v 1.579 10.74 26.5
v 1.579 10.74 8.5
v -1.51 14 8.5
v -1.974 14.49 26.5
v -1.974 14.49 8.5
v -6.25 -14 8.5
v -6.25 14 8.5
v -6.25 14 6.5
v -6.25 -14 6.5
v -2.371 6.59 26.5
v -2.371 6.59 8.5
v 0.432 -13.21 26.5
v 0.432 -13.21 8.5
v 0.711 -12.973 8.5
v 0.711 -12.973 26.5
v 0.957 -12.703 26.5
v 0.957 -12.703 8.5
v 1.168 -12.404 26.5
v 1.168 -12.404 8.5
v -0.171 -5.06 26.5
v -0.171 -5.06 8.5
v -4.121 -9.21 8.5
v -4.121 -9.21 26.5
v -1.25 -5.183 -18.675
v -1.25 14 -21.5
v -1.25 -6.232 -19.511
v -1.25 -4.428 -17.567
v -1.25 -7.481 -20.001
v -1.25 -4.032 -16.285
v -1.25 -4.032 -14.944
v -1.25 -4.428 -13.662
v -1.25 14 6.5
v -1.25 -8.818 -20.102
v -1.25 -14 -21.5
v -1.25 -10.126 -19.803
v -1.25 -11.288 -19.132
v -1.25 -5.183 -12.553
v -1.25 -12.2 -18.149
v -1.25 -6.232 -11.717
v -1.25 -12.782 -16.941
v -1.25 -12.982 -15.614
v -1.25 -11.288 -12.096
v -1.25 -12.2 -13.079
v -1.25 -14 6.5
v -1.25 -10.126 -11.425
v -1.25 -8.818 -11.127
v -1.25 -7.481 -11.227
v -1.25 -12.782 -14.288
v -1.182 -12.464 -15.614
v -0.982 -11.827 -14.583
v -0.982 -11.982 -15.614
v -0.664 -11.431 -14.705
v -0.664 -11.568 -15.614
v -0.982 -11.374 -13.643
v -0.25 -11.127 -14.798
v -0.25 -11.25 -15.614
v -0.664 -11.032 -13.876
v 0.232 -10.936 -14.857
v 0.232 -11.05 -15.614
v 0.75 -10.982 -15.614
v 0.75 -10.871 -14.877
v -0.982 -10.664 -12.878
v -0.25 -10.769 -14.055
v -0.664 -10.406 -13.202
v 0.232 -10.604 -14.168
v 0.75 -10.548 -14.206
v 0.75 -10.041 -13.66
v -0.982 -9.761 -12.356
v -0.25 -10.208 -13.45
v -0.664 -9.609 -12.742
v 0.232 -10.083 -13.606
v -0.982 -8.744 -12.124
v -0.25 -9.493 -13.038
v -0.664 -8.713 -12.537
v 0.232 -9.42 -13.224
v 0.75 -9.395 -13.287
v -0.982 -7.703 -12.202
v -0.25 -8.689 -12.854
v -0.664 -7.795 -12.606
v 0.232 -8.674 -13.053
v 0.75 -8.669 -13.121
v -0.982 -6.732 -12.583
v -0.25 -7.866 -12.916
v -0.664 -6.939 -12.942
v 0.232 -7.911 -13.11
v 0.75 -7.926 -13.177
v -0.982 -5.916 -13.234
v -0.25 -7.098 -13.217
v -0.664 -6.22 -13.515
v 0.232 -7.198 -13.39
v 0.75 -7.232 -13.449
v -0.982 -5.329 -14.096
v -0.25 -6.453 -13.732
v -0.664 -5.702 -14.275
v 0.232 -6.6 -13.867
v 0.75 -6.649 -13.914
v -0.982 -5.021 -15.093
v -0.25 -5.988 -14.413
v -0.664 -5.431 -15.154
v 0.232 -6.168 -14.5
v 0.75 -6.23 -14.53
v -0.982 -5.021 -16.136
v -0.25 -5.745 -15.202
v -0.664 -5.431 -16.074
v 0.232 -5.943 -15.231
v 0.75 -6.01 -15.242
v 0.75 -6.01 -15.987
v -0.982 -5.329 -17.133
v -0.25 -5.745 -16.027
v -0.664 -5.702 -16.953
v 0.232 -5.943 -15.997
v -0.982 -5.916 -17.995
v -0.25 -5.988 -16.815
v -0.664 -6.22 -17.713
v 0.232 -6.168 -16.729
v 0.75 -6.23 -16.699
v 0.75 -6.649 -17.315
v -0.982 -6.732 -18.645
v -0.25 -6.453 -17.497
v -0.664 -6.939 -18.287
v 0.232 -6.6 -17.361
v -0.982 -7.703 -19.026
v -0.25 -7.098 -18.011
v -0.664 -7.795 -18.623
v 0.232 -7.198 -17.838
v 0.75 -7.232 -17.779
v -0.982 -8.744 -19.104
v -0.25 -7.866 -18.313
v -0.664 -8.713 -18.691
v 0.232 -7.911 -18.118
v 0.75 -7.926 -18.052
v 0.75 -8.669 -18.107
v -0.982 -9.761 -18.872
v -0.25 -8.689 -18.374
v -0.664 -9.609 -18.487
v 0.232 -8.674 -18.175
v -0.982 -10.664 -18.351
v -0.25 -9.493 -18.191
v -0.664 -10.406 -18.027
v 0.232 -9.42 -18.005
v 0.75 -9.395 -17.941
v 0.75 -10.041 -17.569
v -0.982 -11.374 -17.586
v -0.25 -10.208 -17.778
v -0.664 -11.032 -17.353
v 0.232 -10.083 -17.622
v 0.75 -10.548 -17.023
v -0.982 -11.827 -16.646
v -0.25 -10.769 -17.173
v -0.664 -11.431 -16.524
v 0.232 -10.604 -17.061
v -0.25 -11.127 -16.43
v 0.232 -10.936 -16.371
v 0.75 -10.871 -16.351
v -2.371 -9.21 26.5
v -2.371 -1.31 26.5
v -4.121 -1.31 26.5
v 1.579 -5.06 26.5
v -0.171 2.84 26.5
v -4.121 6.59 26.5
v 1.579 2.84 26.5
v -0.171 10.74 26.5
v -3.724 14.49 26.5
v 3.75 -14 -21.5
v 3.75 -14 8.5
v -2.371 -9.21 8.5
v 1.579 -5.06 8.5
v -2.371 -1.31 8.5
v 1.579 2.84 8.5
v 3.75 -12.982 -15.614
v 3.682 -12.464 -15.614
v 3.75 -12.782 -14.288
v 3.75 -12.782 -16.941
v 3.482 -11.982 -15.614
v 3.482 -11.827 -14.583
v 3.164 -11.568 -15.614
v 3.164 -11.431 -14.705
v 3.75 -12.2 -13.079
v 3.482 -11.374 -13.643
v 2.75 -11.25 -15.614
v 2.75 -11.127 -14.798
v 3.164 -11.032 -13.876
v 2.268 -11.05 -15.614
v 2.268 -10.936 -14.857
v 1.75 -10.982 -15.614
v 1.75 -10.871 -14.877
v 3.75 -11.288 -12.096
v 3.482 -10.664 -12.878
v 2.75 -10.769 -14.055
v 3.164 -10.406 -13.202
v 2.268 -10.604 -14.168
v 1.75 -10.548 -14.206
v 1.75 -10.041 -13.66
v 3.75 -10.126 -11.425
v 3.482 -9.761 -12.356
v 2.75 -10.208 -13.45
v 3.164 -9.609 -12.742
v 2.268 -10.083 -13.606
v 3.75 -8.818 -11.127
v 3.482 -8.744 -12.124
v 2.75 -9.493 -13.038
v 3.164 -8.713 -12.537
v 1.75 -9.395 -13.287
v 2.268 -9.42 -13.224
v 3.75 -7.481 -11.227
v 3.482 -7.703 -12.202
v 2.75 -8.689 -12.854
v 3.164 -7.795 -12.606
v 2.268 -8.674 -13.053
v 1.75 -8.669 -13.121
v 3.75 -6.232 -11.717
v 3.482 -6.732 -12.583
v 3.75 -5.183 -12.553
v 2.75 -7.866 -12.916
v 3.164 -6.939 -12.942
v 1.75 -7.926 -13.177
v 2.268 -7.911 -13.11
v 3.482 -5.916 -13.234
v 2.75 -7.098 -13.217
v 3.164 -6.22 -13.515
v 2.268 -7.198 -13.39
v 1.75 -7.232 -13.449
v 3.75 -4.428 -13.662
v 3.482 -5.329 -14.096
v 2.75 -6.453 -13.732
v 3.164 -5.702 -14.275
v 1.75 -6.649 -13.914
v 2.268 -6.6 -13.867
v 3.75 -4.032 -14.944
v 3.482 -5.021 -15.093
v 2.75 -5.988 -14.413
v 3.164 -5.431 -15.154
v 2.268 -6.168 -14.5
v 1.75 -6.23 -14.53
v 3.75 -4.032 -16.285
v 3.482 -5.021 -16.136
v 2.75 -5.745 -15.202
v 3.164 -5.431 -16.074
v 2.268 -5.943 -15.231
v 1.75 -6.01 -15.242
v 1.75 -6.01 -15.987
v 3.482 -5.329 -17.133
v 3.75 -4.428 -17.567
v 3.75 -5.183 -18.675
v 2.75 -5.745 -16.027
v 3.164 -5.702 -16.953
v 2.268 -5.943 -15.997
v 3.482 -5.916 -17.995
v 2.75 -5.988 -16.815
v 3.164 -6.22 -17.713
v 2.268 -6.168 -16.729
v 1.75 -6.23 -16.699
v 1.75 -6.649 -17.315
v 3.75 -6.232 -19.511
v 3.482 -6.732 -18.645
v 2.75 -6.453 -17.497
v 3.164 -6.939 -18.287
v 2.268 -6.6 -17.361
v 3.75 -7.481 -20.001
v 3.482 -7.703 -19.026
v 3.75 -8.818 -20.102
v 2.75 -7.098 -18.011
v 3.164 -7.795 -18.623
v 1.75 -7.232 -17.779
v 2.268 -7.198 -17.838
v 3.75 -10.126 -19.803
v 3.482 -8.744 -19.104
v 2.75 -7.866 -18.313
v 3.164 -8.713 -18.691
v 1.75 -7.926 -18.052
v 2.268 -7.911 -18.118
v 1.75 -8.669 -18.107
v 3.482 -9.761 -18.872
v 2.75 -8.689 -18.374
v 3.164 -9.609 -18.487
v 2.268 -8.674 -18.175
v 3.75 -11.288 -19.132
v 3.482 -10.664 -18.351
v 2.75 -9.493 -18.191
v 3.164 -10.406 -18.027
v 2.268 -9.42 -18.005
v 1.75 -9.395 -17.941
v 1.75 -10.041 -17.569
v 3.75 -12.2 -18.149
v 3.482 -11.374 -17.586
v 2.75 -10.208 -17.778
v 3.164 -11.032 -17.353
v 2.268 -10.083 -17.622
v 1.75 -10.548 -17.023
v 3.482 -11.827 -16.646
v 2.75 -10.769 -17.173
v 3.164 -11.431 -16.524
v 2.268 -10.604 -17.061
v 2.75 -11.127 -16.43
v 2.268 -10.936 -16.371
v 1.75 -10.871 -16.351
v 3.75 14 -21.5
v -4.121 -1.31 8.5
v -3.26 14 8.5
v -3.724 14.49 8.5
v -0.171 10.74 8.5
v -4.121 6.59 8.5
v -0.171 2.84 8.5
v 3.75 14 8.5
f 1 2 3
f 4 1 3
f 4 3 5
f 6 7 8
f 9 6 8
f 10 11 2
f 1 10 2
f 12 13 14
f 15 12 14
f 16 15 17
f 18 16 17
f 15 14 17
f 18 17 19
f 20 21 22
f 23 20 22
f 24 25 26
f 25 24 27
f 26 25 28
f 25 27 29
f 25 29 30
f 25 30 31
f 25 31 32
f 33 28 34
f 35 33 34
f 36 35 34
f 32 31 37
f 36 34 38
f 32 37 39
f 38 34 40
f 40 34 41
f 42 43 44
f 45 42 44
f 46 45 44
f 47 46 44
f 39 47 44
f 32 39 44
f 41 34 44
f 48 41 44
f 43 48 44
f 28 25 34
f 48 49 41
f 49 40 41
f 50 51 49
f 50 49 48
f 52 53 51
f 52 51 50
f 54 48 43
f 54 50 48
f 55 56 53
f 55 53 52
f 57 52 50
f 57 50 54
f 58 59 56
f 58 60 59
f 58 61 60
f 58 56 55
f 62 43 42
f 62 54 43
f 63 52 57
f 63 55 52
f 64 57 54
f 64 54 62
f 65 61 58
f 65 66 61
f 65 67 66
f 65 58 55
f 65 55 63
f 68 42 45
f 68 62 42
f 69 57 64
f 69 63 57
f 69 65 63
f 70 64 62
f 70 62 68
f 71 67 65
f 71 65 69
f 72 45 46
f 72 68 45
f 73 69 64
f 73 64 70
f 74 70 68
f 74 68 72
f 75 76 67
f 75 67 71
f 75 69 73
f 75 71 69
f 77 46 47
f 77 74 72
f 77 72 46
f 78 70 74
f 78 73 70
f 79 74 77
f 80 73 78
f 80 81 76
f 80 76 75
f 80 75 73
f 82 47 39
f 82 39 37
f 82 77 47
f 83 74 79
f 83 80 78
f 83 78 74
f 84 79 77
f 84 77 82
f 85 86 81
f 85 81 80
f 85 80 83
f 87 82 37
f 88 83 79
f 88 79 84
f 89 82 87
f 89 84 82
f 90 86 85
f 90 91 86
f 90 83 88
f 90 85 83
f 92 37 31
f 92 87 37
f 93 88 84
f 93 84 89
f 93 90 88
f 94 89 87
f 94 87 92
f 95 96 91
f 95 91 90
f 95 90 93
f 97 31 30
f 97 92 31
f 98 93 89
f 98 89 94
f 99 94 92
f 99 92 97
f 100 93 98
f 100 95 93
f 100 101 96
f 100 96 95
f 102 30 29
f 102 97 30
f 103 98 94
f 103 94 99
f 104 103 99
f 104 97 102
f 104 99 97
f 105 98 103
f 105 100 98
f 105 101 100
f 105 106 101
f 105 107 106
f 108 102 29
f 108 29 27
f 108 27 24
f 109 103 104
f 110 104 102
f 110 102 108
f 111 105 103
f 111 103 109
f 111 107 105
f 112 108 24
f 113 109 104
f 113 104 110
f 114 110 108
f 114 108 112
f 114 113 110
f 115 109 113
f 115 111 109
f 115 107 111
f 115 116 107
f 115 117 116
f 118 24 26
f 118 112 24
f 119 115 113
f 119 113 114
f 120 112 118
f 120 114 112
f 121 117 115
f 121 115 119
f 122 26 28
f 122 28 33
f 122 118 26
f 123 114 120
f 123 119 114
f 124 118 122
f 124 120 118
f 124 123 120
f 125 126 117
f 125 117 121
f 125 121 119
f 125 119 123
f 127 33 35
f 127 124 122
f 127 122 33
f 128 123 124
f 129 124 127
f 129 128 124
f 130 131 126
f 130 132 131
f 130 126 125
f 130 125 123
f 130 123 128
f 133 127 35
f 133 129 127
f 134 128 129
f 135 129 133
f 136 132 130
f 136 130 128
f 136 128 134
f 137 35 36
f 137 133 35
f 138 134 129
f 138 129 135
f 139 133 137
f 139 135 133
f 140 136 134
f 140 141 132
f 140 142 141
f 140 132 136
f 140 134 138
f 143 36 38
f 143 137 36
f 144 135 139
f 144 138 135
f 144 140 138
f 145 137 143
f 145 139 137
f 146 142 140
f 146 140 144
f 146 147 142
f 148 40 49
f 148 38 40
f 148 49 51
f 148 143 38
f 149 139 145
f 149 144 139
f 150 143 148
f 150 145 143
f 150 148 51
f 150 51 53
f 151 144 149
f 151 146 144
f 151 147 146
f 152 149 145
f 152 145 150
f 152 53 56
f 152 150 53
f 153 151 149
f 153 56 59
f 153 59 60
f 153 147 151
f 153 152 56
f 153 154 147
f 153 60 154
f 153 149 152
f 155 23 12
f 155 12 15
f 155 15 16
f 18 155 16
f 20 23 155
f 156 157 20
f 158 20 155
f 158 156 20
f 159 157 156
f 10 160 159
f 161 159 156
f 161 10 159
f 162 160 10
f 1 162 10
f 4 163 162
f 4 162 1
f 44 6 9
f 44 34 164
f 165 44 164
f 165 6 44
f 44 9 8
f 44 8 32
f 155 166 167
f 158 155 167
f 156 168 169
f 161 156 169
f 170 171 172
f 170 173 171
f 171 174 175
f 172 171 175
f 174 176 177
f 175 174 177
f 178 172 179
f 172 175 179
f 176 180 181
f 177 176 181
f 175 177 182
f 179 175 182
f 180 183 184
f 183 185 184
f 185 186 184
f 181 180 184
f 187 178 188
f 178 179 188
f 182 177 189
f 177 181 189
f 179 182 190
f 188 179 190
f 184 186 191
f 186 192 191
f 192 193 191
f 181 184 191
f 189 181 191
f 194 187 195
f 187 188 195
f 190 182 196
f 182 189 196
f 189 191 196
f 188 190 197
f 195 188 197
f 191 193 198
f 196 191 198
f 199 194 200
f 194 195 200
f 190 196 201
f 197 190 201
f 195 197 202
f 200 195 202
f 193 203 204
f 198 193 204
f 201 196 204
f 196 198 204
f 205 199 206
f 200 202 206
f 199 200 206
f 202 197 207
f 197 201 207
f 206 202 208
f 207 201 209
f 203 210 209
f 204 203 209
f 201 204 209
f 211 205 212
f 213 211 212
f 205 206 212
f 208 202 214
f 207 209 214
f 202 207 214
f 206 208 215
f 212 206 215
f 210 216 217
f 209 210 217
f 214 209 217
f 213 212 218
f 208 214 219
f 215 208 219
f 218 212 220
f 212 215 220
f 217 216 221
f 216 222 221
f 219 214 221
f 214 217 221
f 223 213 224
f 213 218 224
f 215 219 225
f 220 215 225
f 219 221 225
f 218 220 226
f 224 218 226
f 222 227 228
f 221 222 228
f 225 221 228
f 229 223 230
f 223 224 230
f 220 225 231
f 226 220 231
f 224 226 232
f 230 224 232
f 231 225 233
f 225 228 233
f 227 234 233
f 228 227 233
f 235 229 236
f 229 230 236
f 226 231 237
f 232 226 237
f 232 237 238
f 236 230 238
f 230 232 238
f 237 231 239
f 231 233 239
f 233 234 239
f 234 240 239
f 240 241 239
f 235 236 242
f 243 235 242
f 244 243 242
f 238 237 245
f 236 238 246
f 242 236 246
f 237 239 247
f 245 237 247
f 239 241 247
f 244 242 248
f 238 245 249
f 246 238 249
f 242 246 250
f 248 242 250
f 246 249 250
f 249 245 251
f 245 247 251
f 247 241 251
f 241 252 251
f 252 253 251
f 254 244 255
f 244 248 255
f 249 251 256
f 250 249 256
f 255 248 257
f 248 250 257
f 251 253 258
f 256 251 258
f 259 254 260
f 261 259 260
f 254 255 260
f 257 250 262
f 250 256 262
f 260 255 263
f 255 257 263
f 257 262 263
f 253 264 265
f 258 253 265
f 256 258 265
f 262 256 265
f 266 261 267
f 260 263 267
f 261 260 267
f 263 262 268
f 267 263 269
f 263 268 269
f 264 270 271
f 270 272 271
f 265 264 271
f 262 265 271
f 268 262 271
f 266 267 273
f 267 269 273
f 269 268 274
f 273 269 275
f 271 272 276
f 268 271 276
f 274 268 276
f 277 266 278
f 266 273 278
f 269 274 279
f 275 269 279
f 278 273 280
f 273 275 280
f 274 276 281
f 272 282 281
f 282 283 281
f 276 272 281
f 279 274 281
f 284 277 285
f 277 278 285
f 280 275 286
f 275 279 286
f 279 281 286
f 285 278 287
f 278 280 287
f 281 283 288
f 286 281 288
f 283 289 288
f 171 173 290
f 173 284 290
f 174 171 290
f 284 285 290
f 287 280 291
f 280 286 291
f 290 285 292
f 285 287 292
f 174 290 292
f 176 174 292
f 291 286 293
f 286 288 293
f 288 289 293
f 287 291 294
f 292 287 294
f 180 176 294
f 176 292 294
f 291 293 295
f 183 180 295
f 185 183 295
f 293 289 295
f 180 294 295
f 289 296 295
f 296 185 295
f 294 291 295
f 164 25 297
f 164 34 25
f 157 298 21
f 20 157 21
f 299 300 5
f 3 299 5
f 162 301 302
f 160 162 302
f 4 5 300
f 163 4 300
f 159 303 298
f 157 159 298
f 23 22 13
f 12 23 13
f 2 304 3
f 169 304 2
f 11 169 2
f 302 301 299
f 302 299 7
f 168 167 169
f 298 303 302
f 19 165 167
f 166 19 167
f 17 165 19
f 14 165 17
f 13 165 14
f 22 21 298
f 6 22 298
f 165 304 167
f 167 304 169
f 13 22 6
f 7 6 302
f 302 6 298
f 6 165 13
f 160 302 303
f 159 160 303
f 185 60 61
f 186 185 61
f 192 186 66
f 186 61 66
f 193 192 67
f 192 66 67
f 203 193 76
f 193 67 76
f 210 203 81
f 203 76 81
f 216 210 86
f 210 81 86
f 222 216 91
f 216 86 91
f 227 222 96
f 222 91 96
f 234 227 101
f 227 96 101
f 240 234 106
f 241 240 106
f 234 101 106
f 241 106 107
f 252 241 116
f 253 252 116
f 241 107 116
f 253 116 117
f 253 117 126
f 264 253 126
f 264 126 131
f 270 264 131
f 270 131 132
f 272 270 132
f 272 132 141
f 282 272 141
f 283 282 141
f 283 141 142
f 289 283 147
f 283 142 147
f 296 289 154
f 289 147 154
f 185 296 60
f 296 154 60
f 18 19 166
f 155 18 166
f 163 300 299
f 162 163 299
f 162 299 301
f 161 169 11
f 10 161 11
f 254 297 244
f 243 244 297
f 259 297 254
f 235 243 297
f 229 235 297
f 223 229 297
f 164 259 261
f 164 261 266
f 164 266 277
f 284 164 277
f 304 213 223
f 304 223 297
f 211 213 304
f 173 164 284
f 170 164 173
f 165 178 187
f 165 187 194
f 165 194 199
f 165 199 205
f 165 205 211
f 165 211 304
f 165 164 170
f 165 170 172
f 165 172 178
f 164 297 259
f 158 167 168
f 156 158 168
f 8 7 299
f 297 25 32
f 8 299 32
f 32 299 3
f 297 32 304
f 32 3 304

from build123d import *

# Parameters (mm, degrees)
F0_W     = 5
F0_H     = 28
F1_DEPTH = 14
F3_DEPTH = 18
F4_R     = 2.5
F5_DEPTH = 5
F6_R     = 2


# Not quite as in the source:
# - a feature names something its author has since deleted; it is built from what else it names


with BuildPart() as f1:
    # F0 (on Front) → F1 (new body, symmetric)
    with BuildSketch(Plane.XZ):
        Polygon((3.75, 8.5), (-6.25, 8.5), (-6.25, 6.5), (-1.25, 6.5), (3.75, 6.5), align=None)
        with Locations((1.25, -7.5)):
            Rectangle(F0_W, F0_H)
    extrude(amount=F1_DEPTH, both=True)

    # F2 (on face) → F3 (join)
    with BuildSketch(Plane.XY.offset(8.5)):
        with BuildLine():
            Line((-1.9743843018, 14.4904378137), (-3.7243843018, 14.4904378137))
            Line((-3.7243843018, 14.4904378137), (-0.1705003797, 10.7404378137))
            Line((-0.1705003797, 10.7404378137), (-4.1205003797, 6.5904378137))
            Line((-4.1205003797, 6.5904378137), (-0.1705003797, 2.8404378137))
            Line((-0.1705003797, 2.8404378137), (-4.1205003797, -1.3095621863))
            Line((-4.1205003797, -1.3095621863), (-0.1705003797, -5.0595621863))
            Line((-0.1705003797, -5.0595621863), (-4.1205003797, -9.2095621863))
            Line((-4.1205003797, -9.2095621863), (0.4322179562, -13.2100868422))
            ThreePointArc((0.4322179562, -13.2100868422), (0.838165637, -12.8418212057), (1.1682262547, -12.4042448269))
            Line((1.1682262547, -12.4042448269), (-2.3705003797, -9.2095621863))
            Line((-2.3705003797, -9.2095621863), (1.5794996203, -5.0595621863))
            Line((1.5794996203, -5.0595621863), (-2.3705003797, -1.3095621863))
            Line((-2.3705003797, -1.3095621863), (1.5794996203, 2.8404378137))
            Line((1.5794996203, 2.8404378137), (-2.3705003797, 6.5904378137))
            Line((-2.3705003797, 6.5904378137), (1.5794996203, 10.7404378137))
            Line((1.5794996203, 10.7404378137), (-1.9743843018, 14.4904378137))
        make_face()
    extrude(amount=F3_DEPTH)

    # F4 (on face) → F5 (cut, symmetric)
    with BuildSketch(Plane(origin=(-1.25, 0, 0), x_dir=(0, -1, 0), z_dir=(-1, 0, 0))):
        with Locations((8.4821127024, -15.6142489255)):
            Circle(F4_R)
    extrude(amount=F5_DEPTH, both=True, mode=Mode.SUBTRACT)

    # F6
    f6_edges = [f1.edges().sort_by_distance(p)[0] for p in [
        (3.75, -5.982113, -15.614249),
        (-1.25, -5.982113, -15.614249),
    ]]
    fillet(f6_edges, radius=F6_R)


solid = f1.part
